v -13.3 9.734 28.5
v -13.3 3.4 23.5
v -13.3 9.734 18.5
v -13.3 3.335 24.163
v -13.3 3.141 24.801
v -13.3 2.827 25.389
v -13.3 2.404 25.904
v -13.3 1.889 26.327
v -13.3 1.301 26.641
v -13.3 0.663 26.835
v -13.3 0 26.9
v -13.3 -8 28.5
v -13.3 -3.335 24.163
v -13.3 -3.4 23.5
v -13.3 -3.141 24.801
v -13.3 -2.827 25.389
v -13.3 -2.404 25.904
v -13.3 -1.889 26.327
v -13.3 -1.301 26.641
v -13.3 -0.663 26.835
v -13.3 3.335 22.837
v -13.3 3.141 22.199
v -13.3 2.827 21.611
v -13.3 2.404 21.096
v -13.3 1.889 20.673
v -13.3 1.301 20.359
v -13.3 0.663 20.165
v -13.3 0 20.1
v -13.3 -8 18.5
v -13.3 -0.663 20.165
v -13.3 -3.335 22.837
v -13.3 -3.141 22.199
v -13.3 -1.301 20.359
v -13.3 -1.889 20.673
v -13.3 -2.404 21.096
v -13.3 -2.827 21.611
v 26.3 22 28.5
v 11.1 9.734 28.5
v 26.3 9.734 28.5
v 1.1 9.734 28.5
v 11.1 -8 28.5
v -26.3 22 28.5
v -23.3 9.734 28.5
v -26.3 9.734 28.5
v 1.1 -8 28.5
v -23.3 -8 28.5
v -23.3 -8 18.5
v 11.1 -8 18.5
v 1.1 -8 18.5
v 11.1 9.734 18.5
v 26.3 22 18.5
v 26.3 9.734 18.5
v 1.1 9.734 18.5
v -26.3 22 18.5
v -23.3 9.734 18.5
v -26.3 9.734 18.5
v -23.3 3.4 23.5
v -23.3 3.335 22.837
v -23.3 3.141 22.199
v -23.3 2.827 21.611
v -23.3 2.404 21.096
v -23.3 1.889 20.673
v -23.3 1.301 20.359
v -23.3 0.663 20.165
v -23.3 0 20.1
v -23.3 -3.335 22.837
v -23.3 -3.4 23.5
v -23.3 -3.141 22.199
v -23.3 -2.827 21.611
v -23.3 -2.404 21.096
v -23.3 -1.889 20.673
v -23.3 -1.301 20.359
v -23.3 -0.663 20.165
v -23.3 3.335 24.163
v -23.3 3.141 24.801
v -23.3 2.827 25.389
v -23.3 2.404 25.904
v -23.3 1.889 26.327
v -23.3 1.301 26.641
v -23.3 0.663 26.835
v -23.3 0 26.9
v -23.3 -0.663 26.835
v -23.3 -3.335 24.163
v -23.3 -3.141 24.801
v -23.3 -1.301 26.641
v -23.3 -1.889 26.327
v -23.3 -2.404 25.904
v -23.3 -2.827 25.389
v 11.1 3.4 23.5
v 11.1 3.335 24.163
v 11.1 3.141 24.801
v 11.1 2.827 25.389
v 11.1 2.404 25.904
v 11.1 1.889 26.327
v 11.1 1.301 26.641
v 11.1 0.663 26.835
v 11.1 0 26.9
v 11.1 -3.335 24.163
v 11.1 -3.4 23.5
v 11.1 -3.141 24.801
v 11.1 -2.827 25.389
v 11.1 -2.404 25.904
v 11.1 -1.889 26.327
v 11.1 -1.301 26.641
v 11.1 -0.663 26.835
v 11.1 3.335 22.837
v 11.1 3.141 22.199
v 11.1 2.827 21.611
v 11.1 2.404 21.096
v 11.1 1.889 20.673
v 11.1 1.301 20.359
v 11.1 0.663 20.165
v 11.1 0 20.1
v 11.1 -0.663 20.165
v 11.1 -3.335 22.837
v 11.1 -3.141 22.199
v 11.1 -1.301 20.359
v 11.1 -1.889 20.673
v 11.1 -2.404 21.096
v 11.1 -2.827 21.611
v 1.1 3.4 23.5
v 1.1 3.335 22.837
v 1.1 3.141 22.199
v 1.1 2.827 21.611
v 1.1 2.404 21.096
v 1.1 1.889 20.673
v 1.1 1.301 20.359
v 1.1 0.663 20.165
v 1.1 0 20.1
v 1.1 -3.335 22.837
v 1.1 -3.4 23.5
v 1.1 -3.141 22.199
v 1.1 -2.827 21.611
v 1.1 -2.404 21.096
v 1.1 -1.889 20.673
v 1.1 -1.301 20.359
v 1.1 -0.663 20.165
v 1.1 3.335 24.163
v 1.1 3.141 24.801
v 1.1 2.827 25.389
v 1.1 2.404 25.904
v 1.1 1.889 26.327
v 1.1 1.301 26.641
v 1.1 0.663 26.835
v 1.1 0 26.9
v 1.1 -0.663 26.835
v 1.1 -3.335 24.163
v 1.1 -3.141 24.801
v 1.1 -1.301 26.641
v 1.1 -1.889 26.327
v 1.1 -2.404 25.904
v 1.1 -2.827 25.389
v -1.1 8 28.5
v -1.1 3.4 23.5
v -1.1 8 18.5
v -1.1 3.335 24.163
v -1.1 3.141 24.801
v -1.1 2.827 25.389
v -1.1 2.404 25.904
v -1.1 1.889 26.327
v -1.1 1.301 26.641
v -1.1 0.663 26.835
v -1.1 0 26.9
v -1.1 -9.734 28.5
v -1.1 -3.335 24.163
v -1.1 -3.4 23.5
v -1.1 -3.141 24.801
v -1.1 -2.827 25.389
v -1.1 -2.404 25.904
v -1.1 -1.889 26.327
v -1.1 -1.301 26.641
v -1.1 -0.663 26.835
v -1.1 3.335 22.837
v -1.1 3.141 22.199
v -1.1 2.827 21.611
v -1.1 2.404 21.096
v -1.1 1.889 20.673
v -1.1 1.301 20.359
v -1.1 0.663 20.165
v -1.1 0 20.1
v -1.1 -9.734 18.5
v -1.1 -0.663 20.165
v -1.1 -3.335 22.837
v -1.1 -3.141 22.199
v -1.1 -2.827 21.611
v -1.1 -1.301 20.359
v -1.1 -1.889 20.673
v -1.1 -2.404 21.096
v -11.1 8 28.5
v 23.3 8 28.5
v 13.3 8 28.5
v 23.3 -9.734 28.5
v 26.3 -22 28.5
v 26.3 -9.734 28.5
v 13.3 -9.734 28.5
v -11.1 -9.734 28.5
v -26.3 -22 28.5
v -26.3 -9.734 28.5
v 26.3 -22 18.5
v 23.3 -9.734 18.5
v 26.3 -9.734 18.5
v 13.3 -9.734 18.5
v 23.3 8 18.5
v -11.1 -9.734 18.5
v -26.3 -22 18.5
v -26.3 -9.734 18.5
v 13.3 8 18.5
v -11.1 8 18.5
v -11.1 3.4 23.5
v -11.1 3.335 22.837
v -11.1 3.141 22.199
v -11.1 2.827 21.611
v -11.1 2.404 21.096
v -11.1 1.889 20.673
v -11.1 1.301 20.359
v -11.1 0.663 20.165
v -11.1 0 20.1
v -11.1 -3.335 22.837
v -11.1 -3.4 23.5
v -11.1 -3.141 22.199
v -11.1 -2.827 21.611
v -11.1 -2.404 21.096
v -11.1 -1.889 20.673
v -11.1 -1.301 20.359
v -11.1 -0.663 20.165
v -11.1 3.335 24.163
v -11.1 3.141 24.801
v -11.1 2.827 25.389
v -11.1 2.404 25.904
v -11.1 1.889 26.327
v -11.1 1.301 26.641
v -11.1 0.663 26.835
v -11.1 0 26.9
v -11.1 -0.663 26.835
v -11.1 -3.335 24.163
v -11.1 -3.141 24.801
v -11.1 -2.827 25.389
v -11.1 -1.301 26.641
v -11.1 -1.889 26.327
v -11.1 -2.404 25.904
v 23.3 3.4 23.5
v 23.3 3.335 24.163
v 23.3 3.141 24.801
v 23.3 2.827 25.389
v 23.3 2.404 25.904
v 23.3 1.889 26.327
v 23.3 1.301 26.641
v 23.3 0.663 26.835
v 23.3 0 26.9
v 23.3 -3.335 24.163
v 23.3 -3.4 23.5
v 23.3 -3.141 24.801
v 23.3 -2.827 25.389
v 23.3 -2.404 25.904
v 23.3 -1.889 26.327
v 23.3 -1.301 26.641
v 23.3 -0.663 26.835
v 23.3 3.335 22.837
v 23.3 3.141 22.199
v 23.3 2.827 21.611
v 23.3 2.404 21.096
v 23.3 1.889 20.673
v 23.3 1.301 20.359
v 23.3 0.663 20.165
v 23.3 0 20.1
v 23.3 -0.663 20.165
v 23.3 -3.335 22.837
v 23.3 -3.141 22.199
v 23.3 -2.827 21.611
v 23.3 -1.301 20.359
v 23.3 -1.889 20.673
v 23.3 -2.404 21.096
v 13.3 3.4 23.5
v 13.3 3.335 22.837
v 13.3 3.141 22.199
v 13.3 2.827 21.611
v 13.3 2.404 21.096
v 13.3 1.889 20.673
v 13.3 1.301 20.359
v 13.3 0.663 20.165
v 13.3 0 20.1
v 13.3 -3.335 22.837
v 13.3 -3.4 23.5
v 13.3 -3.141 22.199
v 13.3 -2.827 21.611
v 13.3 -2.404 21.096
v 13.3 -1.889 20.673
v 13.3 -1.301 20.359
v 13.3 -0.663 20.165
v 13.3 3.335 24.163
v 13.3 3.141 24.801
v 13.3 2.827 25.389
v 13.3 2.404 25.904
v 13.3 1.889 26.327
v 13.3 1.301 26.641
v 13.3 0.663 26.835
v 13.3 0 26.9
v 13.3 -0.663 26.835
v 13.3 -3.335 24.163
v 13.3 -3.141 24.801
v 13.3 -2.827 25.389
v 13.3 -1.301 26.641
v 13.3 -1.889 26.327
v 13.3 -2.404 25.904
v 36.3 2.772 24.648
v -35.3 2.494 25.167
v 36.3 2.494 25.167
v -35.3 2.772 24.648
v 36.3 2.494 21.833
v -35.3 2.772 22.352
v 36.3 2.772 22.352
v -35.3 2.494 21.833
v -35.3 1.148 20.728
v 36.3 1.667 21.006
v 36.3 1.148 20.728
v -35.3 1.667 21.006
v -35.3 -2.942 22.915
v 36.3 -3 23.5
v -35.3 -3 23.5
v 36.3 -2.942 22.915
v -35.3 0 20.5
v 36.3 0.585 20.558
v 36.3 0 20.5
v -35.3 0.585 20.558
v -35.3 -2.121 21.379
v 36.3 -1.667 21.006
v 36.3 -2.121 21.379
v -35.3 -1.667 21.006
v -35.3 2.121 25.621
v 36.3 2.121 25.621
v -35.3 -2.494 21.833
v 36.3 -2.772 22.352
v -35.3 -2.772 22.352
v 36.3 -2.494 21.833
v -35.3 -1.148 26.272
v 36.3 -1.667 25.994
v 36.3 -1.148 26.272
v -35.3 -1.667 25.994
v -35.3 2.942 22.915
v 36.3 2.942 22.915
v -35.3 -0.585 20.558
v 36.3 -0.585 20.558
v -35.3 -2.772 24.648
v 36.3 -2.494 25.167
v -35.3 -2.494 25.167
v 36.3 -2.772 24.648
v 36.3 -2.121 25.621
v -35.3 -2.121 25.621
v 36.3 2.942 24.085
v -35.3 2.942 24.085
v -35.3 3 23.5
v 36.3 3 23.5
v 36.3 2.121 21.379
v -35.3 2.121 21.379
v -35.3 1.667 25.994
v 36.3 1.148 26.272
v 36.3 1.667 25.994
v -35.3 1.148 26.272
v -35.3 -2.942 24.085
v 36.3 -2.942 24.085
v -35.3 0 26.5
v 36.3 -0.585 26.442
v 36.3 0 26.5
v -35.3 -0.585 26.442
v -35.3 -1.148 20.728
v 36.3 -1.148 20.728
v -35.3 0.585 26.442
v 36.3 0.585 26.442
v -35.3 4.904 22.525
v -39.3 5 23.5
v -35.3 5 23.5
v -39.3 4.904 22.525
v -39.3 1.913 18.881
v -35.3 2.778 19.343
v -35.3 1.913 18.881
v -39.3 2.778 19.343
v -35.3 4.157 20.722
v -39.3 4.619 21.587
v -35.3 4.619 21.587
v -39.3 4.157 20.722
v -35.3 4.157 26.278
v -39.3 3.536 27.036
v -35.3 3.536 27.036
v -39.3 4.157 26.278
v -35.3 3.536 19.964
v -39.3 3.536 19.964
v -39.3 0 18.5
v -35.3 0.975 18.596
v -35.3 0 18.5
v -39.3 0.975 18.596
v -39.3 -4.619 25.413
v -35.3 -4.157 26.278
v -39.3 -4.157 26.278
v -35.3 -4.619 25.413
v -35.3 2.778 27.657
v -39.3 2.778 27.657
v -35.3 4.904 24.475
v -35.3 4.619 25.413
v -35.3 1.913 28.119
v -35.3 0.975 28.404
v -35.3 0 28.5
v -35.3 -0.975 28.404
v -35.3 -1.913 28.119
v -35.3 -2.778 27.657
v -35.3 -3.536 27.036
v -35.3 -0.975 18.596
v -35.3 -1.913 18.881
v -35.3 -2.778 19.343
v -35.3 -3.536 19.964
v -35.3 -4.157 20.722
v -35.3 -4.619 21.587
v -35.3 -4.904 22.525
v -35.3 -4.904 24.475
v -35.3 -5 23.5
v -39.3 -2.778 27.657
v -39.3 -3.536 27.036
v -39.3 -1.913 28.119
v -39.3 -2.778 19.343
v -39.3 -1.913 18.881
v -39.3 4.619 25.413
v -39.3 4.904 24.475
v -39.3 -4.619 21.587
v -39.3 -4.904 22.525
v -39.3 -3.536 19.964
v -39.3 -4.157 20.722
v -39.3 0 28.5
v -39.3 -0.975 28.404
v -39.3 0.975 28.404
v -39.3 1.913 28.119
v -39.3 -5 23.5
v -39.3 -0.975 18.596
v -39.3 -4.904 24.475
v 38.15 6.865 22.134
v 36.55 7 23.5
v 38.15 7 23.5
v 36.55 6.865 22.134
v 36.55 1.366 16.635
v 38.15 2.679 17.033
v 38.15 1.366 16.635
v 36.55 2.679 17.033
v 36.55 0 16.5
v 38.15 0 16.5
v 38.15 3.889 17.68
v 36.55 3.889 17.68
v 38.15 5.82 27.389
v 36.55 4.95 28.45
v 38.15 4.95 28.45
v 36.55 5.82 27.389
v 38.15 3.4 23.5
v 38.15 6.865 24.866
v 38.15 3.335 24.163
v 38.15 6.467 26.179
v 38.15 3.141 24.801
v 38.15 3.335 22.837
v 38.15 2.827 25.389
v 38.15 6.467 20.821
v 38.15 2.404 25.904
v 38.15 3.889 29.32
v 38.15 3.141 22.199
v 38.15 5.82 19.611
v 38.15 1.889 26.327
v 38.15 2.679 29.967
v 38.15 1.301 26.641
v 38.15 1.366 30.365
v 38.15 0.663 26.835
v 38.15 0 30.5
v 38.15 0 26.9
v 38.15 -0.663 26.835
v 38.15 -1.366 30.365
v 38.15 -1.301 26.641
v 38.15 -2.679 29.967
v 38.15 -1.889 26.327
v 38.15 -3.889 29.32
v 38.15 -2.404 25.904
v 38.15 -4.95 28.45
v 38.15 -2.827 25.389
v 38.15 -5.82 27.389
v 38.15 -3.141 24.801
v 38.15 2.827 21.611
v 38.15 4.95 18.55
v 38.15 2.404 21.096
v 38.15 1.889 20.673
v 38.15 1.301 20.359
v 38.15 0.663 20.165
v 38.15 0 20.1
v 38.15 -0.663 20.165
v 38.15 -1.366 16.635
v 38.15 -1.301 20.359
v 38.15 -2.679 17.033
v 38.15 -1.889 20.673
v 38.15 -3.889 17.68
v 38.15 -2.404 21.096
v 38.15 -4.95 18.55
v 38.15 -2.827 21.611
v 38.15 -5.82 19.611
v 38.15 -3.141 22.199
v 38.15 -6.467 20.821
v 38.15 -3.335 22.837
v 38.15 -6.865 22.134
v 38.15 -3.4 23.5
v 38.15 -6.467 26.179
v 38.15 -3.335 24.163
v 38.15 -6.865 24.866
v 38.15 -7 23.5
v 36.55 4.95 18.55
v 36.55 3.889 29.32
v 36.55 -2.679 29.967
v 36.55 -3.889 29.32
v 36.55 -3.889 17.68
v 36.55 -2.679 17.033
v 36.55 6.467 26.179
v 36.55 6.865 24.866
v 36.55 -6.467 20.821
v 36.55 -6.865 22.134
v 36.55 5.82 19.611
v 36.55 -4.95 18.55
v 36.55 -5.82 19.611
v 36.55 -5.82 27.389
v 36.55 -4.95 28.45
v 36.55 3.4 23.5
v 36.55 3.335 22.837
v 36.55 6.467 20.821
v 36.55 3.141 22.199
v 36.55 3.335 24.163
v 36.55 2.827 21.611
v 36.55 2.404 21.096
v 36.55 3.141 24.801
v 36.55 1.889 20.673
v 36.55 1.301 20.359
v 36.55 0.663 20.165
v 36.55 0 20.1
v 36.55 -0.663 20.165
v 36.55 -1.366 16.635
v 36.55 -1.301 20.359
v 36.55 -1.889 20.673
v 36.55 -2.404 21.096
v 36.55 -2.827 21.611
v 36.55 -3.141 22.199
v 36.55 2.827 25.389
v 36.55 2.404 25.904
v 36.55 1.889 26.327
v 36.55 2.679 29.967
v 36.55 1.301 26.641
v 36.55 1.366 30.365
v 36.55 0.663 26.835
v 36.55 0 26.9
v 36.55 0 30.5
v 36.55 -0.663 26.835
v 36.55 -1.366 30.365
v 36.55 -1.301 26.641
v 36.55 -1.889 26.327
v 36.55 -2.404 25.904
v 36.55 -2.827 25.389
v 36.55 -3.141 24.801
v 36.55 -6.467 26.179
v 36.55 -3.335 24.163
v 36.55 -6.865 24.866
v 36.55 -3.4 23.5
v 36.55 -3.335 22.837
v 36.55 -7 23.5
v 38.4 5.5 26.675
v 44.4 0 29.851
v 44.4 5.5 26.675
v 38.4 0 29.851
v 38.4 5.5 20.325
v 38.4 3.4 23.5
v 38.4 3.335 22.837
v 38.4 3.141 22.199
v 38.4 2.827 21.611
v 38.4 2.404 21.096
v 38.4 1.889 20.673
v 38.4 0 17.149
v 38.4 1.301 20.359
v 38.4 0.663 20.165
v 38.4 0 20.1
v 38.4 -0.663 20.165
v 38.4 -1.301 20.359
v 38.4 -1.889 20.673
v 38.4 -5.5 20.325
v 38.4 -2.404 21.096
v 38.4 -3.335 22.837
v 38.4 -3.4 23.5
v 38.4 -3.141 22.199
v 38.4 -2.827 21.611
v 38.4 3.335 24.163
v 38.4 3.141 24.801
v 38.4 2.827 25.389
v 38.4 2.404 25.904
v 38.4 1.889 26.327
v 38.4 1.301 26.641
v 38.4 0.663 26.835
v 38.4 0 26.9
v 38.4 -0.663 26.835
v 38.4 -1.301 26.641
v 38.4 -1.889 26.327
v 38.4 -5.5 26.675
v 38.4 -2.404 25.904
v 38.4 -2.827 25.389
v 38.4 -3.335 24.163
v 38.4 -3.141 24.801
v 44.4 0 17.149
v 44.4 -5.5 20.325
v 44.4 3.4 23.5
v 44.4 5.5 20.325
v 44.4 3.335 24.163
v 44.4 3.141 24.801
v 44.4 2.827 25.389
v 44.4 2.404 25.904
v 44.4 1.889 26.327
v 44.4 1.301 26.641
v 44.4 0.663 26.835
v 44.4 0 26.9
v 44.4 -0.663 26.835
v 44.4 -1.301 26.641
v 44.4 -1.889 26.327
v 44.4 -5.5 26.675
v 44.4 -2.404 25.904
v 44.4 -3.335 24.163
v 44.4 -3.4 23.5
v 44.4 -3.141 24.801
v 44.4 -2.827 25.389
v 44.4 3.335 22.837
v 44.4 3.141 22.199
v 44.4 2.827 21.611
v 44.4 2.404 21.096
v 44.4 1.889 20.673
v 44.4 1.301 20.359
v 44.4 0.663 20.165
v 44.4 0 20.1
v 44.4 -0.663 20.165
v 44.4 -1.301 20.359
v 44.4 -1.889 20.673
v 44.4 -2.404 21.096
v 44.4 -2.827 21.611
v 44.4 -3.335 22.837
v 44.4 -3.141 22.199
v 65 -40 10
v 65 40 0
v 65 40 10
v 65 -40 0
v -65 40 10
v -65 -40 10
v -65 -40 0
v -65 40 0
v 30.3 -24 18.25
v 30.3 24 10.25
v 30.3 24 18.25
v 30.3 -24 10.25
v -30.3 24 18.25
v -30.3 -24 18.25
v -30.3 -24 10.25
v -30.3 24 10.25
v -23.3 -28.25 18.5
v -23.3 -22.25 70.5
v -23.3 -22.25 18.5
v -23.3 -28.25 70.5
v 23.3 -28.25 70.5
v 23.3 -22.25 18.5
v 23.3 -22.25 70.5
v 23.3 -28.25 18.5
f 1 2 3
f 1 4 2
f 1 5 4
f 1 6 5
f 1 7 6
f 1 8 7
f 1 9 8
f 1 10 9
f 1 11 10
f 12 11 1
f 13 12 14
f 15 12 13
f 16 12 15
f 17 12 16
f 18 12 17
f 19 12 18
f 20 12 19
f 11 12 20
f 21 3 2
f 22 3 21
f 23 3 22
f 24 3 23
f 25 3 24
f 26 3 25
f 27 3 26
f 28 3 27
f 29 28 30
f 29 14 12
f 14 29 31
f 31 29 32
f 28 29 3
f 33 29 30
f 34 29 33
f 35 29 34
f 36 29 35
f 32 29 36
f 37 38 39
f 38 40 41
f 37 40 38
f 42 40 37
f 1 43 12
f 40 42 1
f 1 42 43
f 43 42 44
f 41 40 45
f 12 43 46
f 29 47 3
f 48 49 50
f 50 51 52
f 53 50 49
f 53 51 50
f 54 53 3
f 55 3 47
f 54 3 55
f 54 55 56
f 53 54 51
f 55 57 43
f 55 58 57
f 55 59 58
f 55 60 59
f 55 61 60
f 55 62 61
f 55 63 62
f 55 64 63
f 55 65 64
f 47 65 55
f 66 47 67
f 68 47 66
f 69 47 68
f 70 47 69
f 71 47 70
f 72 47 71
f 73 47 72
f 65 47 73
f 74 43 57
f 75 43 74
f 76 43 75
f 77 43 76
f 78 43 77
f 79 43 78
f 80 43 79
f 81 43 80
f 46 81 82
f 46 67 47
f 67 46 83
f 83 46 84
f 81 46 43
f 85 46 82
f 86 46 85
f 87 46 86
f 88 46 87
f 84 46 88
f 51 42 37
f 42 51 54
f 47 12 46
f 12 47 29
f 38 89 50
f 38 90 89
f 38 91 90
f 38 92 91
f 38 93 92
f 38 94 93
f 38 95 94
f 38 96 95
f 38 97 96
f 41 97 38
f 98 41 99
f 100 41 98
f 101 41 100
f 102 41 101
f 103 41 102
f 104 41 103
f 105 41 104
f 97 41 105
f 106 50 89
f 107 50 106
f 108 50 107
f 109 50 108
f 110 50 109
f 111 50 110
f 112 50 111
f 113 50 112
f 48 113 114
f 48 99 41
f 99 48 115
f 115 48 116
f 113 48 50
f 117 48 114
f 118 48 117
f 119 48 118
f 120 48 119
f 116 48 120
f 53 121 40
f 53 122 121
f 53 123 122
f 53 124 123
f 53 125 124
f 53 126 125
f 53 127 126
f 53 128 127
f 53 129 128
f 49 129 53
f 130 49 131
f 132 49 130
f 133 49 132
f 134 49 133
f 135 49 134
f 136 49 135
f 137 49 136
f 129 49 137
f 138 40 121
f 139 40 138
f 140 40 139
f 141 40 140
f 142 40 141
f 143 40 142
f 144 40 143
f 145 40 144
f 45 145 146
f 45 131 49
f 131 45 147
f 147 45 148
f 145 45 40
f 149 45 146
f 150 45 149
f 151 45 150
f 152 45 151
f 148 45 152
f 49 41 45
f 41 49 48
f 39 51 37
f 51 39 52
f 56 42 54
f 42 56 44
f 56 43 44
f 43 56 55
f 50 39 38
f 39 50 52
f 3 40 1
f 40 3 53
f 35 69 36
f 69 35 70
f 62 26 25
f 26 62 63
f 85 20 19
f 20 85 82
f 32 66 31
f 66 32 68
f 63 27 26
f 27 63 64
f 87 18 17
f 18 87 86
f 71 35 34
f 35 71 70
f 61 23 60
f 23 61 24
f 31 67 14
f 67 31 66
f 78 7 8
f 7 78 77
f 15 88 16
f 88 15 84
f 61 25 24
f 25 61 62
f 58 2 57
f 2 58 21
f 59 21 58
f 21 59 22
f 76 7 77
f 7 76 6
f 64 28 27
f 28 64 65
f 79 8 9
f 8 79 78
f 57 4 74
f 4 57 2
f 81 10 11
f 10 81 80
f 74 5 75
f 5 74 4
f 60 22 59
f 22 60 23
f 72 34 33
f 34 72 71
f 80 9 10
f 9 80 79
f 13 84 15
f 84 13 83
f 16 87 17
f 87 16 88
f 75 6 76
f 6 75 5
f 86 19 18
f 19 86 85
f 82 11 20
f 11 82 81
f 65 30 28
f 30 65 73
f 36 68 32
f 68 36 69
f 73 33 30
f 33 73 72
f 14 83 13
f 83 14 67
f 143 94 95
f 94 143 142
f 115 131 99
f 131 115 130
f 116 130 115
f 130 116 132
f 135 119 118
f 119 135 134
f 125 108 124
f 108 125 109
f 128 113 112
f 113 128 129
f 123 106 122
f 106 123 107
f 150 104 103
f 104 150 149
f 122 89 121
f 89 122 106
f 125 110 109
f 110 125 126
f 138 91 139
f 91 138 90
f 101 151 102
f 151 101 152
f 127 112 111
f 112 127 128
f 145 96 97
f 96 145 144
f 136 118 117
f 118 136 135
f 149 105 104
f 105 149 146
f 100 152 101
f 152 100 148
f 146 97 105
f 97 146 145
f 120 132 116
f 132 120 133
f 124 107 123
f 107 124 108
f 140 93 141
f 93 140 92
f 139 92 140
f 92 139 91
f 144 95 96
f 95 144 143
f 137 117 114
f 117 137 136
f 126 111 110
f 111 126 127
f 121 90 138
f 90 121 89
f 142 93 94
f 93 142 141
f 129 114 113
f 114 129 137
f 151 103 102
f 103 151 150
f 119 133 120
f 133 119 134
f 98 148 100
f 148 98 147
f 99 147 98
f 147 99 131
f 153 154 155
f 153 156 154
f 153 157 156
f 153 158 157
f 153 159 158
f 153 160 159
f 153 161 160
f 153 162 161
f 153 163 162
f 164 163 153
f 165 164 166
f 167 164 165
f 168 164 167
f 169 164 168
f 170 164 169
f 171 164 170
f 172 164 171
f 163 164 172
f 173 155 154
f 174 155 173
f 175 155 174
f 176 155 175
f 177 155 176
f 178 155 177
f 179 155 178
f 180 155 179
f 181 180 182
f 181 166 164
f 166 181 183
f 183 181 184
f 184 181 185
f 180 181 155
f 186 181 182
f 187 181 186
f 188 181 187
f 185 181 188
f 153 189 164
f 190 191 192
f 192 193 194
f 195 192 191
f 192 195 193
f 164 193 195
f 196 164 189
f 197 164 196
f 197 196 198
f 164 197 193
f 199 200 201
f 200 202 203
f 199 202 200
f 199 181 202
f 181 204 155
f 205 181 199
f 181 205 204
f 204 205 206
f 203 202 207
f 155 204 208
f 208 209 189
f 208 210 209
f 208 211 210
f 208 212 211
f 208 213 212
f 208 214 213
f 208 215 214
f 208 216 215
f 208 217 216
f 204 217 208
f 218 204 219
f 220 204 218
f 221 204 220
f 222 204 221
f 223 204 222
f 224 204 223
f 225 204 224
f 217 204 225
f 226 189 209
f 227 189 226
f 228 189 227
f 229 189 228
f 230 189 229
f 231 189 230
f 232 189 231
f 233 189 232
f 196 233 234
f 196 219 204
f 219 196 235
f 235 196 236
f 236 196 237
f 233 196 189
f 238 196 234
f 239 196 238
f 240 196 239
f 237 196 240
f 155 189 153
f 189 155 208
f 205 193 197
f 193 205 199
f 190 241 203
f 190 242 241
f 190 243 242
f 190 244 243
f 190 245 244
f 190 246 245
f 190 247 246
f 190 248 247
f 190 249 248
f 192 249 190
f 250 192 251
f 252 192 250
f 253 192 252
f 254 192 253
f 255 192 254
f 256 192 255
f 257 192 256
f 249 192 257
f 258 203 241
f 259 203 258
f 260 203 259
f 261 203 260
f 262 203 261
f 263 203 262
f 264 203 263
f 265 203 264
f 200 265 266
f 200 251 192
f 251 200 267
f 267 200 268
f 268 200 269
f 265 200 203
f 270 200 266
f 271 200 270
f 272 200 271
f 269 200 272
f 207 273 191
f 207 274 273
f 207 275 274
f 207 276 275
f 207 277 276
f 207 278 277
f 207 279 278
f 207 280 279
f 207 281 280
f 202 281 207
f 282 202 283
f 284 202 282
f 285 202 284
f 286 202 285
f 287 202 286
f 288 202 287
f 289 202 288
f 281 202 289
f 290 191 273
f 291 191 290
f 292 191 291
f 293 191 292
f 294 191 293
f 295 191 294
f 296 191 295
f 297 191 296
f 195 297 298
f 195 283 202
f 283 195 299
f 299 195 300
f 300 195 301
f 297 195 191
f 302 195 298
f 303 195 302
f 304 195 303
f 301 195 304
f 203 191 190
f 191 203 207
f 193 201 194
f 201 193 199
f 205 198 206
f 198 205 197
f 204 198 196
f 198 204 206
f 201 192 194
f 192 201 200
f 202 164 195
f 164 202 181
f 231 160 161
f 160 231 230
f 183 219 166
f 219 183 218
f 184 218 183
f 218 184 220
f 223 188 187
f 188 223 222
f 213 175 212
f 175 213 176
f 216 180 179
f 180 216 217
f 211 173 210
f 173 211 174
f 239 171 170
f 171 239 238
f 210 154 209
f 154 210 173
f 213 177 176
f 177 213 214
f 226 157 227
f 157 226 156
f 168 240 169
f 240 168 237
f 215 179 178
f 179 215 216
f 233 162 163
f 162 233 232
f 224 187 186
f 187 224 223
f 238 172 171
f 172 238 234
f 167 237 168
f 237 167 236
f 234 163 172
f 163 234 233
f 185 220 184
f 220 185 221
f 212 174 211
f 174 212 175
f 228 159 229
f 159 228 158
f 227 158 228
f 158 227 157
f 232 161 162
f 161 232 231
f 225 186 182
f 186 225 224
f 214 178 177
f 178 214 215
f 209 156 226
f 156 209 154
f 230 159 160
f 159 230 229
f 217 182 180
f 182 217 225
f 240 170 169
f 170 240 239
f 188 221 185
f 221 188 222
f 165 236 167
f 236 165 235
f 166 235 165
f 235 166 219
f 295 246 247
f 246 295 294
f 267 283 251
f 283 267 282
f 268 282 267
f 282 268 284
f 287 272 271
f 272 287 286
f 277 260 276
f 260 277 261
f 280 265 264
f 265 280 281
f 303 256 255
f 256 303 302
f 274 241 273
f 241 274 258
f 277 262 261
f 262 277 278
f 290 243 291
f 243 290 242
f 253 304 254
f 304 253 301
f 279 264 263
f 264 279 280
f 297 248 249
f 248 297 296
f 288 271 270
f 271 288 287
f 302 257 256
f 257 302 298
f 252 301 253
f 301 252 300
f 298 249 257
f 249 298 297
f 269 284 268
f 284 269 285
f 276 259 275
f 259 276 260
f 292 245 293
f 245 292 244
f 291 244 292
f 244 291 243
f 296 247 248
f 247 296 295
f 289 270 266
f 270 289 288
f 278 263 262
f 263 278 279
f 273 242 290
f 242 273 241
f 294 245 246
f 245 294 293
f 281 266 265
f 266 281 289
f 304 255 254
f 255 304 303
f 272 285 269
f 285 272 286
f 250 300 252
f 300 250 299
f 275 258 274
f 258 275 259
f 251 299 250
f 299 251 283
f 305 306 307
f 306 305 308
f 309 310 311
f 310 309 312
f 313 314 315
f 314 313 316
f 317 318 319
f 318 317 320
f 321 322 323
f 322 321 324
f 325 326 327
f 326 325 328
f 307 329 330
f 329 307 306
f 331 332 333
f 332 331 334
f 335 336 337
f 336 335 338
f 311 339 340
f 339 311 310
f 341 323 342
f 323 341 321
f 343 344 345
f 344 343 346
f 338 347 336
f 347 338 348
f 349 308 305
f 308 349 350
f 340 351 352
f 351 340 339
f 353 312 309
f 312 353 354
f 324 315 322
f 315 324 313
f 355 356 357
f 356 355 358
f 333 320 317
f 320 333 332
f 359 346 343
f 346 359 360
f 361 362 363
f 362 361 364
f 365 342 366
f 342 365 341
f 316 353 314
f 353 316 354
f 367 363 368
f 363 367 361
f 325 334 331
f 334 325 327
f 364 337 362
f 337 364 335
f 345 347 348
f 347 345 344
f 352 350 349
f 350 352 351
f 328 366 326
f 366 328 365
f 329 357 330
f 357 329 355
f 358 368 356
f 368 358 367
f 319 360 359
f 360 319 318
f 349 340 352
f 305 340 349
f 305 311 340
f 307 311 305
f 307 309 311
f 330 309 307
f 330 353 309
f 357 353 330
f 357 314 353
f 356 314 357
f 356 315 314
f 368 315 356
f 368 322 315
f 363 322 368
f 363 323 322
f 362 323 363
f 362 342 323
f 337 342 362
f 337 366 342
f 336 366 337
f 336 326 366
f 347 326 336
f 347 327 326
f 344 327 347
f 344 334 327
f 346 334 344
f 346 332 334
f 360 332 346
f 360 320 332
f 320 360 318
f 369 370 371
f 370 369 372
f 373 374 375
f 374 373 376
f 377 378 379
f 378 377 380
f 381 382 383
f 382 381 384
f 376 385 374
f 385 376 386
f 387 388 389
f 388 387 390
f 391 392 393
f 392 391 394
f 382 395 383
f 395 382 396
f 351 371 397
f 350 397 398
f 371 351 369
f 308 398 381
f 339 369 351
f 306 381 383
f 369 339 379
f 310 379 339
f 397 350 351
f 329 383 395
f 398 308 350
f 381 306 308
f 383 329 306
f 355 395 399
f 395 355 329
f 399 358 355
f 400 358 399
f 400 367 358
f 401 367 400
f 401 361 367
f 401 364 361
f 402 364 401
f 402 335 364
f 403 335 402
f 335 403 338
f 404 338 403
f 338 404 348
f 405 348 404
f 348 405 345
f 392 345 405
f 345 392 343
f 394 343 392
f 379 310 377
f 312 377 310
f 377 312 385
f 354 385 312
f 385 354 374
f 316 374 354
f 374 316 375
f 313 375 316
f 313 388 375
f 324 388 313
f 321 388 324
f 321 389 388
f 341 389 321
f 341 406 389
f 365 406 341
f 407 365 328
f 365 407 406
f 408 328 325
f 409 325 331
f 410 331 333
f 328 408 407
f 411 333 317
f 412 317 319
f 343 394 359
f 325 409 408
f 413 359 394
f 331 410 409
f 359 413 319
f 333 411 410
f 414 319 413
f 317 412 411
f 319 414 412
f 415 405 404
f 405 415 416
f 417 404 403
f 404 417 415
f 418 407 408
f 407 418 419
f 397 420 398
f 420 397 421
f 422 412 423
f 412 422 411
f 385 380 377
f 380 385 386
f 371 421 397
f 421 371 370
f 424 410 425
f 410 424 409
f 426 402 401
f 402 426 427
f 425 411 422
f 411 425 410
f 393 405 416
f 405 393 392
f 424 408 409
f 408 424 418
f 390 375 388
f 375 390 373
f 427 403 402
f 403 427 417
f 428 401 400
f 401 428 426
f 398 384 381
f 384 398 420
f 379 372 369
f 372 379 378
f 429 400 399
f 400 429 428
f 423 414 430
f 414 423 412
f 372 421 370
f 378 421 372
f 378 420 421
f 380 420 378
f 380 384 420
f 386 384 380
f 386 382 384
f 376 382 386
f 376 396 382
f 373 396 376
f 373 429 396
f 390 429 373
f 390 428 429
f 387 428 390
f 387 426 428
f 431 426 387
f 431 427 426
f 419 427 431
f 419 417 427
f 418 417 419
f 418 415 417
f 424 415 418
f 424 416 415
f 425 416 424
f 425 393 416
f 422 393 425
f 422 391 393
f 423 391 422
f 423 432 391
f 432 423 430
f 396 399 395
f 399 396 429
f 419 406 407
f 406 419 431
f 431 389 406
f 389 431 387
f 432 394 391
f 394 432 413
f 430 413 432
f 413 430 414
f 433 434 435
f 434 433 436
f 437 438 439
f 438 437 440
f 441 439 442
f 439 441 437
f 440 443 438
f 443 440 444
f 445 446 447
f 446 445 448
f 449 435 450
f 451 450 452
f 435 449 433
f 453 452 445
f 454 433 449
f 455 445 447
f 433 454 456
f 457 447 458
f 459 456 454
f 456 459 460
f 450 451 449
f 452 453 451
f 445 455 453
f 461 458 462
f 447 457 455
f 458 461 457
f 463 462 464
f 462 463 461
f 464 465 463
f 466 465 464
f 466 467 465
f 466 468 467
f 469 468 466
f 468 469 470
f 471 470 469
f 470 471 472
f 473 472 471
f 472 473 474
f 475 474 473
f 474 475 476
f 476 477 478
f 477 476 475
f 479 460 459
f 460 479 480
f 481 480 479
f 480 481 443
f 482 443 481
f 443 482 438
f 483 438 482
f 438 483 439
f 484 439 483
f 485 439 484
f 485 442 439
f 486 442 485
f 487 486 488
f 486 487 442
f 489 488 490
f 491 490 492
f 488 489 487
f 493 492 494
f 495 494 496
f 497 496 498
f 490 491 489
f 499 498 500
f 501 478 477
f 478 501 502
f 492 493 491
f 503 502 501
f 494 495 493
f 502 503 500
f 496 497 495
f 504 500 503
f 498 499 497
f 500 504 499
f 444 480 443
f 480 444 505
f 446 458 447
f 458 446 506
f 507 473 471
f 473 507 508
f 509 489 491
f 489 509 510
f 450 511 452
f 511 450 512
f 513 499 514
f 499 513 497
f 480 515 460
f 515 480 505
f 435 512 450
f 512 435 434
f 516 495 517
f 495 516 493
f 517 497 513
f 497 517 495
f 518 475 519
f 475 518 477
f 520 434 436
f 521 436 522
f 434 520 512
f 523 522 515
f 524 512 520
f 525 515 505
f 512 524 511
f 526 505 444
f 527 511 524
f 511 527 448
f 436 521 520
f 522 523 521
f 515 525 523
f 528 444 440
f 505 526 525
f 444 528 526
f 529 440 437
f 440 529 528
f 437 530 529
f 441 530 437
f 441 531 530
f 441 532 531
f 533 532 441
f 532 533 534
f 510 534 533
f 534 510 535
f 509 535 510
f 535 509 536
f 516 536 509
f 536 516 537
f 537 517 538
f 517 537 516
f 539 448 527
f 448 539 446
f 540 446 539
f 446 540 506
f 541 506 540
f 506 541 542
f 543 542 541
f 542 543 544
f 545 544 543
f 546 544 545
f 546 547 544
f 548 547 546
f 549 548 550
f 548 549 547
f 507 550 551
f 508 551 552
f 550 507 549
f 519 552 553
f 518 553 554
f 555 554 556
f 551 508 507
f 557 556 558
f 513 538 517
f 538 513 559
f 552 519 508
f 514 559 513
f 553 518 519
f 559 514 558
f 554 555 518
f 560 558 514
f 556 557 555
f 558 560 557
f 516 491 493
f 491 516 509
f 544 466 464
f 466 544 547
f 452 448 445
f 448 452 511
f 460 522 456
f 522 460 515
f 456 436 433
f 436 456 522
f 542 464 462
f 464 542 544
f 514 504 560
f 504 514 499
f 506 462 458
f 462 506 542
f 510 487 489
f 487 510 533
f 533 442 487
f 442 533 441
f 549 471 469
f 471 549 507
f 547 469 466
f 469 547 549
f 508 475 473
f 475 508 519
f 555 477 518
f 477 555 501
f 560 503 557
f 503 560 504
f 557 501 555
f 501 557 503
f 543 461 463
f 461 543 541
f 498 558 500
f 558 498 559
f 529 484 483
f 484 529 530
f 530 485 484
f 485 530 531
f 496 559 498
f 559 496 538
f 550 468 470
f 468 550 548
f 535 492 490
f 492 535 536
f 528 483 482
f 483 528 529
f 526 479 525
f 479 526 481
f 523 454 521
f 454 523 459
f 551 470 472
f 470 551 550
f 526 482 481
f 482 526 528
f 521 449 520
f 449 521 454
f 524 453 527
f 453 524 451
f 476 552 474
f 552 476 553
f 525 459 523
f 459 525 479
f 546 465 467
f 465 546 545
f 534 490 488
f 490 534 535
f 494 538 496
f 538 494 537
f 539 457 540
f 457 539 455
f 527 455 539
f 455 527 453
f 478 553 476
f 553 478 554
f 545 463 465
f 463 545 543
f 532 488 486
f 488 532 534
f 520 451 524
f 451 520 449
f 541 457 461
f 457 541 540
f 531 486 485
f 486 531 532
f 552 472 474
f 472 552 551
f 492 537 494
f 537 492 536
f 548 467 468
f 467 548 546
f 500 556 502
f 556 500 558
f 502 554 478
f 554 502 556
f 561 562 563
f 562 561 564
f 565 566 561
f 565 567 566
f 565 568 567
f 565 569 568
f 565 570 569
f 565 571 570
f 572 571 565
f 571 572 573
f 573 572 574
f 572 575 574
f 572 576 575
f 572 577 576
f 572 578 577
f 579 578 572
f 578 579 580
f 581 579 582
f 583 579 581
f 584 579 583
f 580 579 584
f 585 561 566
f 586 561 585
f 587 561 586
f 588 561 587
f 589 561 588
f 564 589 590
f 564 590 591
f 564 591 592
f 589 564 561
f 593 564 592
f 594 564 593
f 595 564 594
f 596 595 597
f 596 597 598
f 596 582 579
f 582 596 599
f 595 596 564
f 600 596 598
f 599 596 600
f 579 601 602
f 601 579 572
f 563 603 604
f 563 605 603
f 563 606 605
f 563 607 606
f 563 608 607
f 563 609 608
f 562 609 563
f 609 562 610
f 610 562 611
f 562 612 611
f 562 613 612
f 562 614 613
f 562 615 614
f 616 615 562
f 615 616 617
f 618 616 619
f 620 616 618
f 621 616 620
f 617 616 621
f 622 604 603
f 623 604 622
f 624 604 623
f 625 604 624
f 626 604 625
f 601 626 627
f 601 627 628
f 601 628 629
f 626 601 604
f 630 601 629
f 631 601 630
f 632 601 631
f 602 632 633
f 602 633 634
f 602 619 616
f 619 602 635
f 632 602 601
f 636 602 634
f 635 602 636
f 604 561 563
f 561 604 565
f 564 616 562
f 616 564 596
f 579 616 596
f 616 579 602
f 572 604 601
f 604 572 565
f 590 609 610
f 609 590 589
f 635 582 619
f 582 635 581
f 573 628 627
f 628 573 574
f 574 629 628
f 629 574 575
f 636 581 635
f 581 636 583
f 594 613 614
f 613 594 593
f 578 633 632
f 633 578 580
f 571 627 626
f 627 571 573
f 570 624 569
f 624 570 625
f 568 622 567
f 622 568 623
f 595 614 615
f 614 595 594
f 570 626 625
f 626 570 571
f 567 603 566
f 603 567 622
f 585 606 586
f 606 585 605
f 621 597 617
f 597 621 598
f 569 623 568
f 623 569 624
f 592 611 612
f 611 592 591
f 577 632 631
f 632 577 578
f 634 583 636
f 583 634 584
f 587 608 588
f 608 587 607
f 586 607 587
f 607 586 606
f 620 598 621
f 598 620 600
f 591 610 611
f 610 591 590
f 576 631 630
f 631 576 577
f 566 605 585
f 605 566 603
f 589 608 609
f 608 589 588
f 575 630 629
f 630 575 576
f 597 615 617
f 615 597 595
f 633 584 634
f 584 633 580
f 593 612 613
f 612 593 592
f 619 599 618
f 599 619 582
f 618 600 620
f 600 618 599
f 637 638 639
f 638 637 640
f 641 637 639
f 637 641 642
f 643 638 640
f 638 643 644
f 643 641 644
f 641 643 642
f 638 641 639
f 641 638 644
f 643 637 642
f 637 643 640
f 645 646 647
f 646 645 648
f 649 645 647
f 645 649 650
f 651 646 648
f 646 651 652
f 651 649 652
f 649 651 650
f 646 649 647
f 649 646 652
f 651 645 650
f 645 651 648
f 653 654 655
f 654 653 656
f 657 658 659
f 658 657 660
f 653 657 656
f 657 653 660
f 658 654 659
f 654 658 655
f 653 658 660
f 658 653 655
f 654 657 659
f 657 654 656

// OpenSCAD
$fn = 32;

// ------------------------------------------------------------------------
// Comb hinge with flap: leaf 52.6 x 22 mm, pin d6, flap 52 mm
// Every part is its own module, assembly() places every instance.
// ------------------------------------------------------------------------

// --- part 1 ---
module hinge_bed() {
  difference() {
    translate([-65, -40, 0]) cube([130, 80, 10]);
  }
}

// --- part 2 ---
module hinge_riser() {
  difference() {
    translate([-30.3, -24, 0]) cube([60.6, 48, 8]);
  }
}

// --- part 3 ---
module hinge_leaf_a() {
  difference() {
    union() {
      translate([-23.3, -8, -5]) cube([10, 30, 10]);
      translate([1.1, -8, -5]) cube([10, 30, 10]);
      translate([-26.3, 9.734, -5]) cube([52.6, 12.266, 10]);
    }
    translate([-18.3, 0, 0]) rotate([0, 90, 0]) cylinder(h = 12, d = 6.8, center = true);
    translate([6.1, 0, 0]) rotate([0, 90, 0]) cylinder(h = 12, d = 6.8, center = true);
  }
}

// --- part 4 ---
module hinge_leaf_b() {
  difference() {
    union() {
      translate([-11.1, -22, -5]) cube([10, 30, 10]);
      translate([13.3, -22, -5]) cube([10, 30, 10]);
      translate([-26.3, -22, -5]) cube([52.6, 12.266, 10]);
    }
    translate([-6.1, 0, 0]) rotate([0, 90, 0]) cylinder(h = 12, d = 6.8, center = true);
    translate([18.3, 0, 0]) rotate([0, 90, 0]) cylinder(h = 12, d = 6.8, center = true);
  }
}

// --- part 5 ---
module hinge_flap() {
  difference() {
    translate([-23.3, -26, 0]) cube([46.6, 52, 6]);
  }
}

// --- part 6 ---
module hinge_pin() {
  rotate([0, 90, 0]) cylinder(h = 72.6, d = 6, center = true);
  translate([-39.3, 0, 0]) rotate([0, 90, 0]) cylinder(h = 4, d = 10);
}

// --- part 7 ---
module pin_washer() {
  difference() {
      translate([0, 0, 0]) cylinder(h = 1.6, d = 14);
      translate([0, 0, -1]) cylinder(h = 3.6, d = 6.8);
    }
}

// --- part 8 ---
module pin_nut() {
  difference() {
    linear_extrude(height = 6) polygon(points = [[6.351, 0], [3.175, 5.5], [-3.175, 5.5], [-6.351, 0], [-3.175, -5.5], [3.175, -5.5]]);
    translate([0, 0, -1]) cylinder(h = 8, d = 6.8);
  }
}

// --- assembly ---
module assembly() {
  color([0.80, 0.24, 0.20]) translate([0, 0, 0]) rotate([0, 0, 0]) hinge_bed();
  color([0.20, 0.45, 0.75]) translate([0, 0, 10.25]) rotate([0, 0, 0]) hinge_riser();
  color([0.25, 0.62, 0.32]) translate([0, 0, 23.5]) rotate([0, 0, 0]) hinge_leaf_a();
  color([0.92, 0.70, 0.18]) translate([0, 0, 23.5]) rotate([0, 0, 0]) hinge_leaf_b();
  color([0.58, 0.35, 0.70]) translate([0, -22.25, 44.5]) rotate([90, 0, 0]) hinge_flap();
  color([0.16, 0.66, 0.66]) translate([0, 0, 23.5]) rotate([0, 0, 0]) hinge_pin();
  color([0.85, 0.48, 0.18]) translate([36.55, 0, 23.5]) rotate([0, 90, 0]) pin_washer();
  color([0.55, 0.60, 0.65]) translate([38.4, 0, 23.5]) rotate([0, 90, 0]) pin_nut();
}

assembly();
